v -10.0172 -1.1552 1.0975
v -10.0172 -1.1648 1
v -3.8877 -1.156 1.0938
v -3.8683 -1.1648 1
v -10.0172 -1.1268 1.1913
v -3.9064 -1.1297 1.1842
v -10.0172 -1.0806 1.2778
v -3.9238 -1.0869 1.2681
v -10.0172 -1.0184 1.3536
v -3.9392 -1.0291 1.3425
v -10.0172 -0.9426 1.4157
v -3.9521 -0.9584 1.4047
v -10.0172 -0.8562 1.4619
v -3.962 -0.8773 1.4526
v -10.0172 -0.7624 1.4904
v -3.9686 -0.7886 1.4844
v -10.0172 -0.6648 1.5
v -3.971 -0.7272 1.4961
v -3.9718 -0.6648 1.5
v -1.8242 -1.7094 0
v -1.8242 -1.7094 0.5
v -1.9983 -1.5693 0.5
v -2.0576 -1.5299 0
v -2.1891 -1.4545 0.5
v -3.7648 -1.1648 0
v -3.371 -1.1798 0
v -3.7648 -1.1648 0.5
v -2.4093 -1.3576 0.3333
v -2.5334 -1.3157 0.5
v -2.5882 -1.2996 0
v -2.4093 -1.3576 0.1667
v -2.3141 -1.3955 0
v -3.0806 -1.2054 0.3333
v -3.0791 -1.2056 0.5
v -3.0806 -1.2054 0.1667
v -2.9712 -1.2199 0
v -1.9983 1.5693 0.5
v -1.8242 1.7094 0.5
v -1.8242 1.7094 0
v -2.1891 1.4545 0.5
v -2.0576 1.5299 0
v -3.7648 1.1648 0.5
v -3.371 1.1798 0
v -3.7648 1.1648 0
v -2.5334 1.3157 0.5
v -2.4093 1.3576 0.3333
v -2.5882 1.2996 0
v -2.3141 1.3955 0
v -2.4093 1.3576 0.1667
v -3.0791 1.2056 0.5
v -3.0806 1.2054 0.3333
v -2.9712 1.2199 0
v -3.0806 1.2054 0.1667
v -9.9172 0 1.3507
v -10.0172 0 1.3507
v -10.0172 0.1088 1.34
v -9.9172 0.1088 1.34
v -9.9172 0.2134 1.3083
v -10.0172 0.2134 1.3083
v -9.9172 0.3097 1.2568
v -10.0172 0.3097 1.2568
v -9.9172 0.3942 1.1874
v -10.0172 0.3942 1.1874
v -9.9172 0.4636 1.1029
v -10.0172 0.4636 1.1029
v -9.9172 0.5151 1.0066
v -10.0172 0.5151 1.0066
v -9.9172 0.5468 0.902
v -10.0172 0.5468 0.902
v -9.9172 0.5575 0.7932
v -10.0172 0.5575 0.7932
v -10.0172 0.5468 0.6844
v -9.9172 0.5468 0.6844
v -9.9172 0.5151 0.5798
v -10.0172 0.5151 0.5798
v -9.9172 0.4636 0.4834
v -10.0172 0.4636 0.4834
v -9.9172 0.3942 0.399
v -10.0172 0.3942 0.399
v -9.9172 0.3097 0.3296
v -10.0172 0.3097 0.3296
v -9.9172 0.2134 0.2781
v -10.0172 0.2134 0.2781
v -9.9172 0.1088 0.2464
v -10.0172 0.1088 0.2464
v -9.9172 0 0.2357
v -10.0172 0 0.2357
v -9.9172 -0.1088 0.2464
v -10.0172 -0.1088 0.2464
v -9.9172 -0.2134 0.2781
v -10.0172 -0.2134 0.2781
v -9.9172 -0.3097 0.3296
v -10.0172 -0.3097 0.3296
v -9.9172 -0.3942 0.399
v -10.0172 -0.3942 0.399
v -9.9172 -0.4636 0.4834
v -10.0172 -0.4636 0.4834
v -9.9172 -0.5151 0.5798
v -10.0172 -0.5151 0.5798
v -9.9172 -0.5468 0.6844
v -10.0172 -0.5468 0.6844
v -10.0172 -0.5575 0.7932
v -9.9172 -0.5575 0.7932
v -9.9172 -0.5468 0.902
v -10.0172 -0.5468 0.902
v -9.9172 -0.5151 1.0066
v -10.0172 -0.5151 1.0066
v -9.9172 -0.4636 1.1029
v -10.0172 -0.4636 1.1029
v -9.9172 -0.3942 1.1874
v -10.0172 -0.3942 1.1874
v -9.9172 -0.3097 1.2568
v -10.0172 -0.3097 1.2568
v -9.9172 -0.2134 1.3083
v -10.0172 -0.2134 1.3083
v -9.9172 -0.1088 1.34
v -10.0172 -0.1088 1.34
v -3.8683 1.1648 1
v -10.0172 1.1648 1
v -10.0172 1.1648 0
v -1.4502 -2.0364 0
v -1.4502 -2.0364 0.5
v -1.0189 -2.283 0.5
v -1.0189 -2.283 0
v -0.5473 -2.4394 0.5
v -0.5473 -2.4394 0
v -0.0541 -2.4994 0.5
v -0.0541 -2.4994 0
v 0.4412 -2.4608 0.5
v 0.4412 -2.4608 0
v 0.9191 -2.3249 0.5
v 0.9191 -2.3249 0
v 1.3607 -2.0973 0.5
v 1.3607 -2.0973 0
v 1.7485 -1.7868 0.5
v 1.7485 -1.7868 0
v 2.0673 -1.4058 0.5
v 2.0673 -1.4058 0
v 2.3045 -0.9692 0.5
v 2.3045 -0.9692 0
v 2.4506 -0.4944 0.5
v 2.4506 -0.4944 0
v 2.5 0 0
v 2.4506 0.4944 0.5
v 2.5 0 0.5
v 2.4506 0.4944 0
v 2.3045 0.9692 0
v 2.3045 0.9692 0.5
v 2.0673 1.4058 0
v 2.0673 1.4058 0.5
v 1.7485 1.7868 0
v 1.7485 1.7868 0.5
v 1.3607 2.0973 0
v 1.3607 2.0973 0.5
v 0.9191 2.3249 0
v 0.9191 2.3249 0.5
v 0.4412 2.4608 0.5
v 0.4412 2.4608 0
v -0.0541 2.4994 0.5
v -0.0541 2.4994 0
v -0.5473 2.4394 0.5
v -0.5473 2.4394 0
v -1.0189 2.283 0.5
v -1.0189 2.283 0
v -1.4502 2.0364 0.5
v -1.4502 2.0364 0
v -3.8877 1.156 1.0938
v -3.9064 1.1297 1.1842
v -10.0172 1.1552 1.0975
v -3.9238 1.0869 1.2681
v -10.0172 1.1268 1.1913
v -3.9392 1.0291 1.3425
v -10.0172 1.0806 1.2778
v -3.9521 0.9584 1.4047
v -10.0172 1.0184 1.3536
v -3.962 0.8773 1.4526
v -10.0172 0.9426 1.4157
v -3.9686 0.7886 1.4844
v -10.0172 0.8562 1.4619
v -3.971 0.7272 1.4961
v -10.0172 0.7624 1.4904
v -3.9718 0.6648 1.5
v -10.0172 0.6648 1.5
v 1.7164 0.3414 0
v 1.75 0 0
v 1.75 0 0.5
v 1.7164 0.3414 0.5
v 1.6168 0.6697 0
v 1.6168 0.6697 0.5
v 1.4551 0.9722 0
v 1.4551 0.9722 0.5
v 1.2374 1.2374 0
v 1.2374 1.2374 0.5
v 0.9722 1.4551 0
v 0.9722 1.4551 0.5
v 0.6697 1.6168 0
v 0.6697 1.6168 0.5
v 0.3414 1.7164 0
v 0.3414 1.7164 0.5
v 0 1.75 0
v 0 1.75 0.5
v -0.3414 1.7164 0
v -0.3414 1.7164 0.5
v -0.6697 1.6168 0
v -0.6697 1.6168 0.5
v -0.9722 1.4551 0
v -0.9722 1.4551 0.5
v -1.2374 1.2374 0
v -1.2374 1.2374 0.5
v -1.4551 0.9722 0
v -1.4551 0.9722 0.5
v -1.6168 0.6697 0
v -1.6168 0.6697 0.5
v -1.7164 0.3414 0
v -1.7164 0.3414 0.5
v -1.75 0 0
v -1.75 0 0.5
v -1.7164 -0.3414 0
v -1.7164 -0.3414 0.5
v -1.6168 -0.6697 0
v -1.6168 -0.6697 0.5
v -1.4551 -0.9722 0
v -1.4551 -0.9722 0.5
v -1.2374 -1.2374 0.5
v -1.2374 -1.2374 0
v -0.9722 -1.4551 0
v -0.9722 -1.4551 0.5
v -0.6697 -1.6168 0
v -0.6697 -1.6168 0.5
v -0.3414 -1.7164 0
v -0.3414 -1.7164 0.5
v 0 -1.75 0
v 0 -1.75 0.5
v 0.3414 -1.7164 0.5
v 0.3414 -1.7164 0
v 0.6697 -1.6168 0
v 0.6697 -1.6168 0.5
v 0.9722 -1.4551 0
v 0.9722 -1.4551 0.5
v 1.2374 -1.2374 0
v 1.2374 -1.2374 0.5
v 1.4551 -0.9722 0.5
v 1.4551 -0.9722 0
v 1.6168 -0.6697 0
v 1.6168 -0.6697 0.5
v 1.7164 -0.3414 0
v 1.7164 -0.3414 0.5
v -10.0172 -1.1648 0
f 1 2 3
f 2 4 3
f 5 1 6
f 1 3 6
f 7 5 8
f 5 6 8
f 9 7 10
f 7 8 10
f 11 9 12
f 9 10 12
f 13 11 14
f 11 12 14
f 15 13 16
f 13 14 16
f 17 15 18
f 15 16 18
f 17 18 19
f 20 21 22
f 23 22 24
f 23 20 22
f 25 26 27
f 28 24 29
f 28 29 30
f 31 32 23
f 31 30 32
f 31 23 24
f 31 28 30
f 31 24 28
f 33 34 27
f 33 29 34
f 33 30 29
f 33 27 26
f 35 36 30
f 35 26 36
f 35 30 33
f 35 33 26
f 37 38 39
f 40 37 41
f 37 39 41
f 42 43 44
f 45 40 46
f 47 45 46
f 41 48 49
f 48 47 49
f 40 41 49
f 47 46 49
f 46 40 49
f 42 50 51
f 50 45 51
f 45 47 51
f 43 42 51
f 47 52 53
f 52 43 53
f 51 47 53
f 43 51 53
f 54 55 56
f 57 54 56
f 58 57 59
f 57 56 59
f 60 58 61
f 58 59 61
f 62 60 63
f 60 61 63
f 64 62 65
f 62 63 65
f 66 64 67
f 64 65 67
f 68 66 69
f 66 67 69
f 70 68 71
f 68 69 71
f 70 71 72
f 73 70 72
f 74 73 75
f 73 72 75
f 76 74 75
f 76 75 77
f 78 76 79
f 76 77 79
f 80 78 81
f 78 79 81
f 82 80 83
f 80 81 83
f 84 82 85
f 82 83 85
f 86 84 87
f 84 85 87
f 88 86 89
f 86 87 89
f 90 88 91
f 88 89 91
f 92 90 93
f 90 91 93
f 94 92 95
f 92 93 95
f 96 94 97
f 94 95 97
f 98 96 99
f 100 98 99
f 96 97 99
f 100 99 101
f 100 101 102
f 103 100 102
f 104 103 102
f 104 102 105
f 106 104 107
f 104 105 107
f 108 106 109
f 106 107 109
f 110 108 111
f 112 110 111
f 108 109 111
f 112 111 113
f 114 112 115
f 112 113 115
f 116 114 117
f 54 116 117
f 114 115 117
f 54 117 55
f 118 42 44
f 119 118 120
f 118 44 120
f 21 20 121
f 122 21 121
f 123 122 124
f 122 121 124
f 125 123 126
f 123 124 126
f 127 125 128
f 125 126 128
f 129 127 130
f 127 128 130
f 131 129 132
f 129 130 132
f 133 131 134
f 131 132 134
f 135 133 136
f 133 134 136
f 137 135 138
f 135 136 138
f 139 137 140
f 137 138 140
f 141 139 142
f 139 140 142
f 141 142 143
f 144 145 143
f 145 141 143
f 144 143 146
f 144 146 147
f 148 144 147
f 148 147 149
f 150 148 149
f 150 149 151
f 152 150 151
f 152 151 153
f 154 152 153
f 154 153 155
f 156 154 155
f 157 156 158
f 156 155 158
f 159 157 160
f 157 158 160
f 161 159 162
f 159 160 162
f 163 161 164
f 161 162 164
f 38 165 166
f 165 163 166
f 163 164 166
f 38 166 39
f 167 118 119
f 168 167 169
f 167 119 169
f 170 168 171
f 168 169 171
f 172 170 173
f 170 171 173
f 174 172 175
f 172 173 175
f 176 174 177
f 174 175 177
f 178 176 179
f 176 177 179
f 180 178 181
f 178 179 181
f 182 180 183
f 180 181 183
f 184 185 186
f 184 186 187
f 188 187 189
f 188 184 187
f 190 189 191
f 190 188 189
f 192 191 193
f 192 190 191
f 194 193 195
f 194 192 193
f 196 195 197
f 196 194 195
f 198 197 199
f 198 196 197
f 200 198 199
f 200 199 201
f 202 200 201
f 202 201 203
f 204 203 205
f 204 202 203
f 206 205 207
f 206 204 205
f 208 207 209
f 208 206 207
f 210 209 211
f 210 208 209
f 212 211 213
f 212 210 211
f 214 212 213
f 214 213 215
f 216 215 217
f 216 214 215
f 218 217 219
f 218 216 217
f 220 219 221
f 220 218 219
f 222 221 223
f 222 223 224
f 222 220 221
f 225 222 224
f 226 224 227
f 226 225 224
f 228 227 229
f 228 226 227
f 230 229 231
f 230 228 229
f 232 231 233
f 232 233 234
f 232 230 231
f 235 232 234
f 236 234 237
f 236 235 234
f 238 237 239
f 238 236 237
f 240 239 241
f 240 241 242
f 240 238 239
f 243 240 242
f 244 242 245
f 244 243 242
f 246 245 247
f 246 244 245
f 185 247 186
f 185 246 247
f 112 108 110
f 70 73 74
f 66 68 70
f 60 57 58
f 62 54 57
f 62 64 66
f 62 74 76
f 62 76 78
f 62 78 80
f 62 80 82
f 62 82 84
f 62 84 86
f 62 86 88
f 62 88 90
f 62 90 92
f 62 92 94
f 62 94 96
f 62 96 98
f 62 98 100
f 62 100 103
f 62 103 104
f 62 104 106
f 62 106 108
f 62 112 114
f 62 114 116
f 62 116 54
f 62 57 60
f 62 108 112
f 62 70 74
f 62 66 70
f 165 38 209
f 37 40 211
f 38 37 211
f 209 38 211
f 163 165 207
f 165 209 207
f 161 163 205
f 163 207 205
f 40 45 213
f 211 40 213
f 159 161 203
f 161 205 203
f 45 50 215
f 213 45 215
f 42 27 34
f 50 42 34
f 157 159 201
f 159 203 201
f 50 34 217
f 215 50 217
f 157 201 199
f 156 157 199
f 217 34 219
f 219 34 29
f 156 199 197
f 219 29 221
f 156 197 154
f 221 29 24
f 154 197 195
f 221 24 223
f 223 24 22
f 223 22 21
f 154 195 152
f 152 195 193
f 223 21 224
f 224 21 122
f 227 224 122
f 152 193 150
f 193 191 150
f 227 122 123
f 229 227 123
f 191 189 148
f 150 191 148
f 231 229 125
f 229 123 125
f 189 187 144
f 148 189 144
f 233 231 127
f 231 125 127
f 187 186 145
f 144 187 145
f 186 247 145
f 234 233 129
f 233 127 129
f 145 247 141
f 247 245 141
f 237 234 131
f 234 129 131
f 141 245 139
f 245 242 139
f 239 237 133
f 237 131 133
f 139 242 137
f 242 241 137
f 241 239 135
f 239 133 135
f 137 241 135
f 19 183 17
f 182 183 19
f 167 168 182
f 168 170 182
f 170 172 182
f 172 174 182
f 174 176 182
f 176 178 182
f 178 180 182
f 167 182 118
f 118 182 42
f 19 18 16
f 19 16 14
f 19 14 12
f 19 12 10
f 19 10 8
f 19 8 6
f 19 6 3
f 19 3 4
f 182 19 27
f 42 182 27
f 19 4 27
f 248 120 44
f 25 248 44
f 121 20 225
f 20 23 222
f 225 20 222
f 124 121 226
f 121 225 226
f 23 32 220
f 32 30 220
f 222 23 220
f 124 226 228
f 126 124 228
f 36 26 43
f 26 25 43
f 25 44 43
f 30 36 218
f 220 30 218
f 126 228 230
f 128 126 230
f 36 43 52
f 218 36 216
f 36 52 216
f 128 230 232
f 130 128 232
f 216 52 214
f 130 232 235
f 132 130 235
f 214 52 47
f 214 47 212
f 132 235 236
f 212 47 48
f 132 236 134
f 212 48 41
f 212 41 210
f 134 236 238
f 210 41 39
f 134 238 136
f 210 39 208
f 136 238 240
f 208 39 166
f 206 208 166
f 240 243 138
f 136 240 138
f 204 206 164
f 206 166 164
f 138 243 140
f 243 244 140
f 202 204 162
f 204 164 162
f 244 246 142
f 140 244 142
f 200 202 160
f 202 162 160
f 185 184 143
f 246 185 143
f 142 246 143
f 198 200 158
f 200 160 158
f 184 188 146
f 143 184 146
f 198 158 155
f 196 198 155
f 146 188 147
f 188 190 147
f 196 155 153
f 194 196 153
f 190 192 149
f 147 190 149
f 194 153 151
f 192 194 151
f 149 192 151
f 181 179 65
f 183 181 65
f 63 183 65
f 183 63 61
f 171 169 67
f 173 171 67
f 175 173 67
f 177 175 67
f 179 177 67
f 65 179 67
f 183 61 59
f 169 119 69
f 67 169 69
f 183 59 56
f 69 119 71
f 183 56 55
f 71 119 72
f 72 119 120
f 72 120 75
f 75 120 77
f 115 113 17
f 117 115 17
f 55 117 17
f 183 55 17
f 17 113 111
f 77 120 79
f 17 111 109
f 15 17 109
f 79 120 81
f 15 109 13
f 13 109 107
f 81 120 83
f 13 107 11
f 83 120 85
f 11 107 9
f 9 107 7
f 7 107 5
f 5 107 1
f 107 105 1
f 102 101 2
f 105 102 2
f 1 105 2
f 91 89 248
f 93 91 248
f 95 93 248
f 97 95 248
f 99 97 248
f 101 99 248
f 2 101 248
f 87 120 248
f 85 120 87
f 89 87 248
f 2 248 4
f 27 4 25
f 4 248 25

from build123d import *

# Parameters (mm, degrees)
SKETCH_1_R               = 2.5
SKETCH_1_R_2             = 1.75
EXTRUDE_1_DEPTH          = 0.5
EXTRUDE_2_DEPTH          = 1.5
CUT_EXTRUDE_1_DEPTH      = 11.432842359
CUT_EXTRUDE_1_DEPTH_BACK = 11.432842359
FILLET_1_R               = 0.5
SKETCH_4_R               = 0.557530811
CUT_EXTRUDE_2_DEPTH      = 0.1


with BuildPart() as part:
    # ｽｹｯﾁ1 → ﾎﾞｽ - 押し出し1 (new body)
    with BuildSketch(Plane.XY):
        Circle(SKETCH_1_R)
        Circle(SKETCH_1_R_2, mode=Mode.SUBTRACT)
    extrude(amount=EXTRUDE_1_DEPTH)

    # ｽｹｯﾁ2 → ﾎﾞｽ - 押し出し2 (add)
    with BuildSketch(Plane.XY):
        with BuildLine():
            add(Edge.make_bspline(
                [(-1.824229961, 1.709439981), (-2.341784399, 1.228330404), (-3.098510874, 1.179003243), (-3.764761935, 1.164839708)],
                knots=[0, 0, 0, 0, 1, 1, 1, 1], degree=3))
            Line((-3.764761935, 1.164839708), (-10.01719506, 1.164839708))
            Line((-10.01719506, 1.164839708), (-10.01719506, -1.164839708))
            Line((-10.01719506, -1.164839708), (-3.764761935, -1.164839708))
            add(Edge.make_bspline(
                [(-1.824229961, -1.709439981), (-2.341784399, -1.228330404), (-3.098510874, -1.179003243), (-3.764761935, -1.164839708)],
                knots=[0, 0, 0, 0, 1, 1, 1, 1], degree=3))
            ThreePointArc((-1.824229961, -1.709439981), (-2.324927408, -0.919082449), (-2.5, 0))
            ThreePointArc((-2.5, 0), (-2.324927408, 0.919082449), (-1.824229961, 1.709439981))
        make_face()
    extrude(amount=EXTRUDE_2_DEPTH)

    # ｽｹｯﾁ3 → ｶｯﾄ - 押し出し1 (cut, two sides: drawn at the far end of the back side and taken through both)
    with BuildSketch(Plane(origin=(0, 0, 0), x_dir=(1, 0, 0), z_dir=(0, 1, 0)).offset(-CUT_EXTRUDE_1_DEPTH_BACK)):
        Polygon((-3.986937401, -1.573225325), (-3.764761935, -0.5), (-1.824229961, -0.5), (-1.824229961, -1.921744076), (-3.986937401, -1.921744076), align=None)
    extrude(amount=CUT_EXTRUDE_1_DEPTH + CUT_EXTRUDE_1_DEPTH_BACK, mode=Mode.SUBTRACT)

    # ﾌｨﾚｯﾄ1
    fillet_1_edges = [part.edges().sort_by_distance(p)[0] for p in [
        (-6.994486802, -1.164839708, 1.5),
        (-6.994486802, 1.164839708, 1.5),
    ]]
    fillet(fillet_1_edges, radius=FILLET_1_R)

    # ｽｹｯﾁ4 → ｶｯﾄ - 押し出し2 (cut)
    with BuildSketch(Plane.ZY.offset(10.01719506)):
        with Locations((0.793196725, 0)):
            Circle(SKETCH_4_R)
    extrude(amount=-CUT_EXTRUDE_2_DEPTH, mode=Mode.SUBTRACT)


solid = part.part
